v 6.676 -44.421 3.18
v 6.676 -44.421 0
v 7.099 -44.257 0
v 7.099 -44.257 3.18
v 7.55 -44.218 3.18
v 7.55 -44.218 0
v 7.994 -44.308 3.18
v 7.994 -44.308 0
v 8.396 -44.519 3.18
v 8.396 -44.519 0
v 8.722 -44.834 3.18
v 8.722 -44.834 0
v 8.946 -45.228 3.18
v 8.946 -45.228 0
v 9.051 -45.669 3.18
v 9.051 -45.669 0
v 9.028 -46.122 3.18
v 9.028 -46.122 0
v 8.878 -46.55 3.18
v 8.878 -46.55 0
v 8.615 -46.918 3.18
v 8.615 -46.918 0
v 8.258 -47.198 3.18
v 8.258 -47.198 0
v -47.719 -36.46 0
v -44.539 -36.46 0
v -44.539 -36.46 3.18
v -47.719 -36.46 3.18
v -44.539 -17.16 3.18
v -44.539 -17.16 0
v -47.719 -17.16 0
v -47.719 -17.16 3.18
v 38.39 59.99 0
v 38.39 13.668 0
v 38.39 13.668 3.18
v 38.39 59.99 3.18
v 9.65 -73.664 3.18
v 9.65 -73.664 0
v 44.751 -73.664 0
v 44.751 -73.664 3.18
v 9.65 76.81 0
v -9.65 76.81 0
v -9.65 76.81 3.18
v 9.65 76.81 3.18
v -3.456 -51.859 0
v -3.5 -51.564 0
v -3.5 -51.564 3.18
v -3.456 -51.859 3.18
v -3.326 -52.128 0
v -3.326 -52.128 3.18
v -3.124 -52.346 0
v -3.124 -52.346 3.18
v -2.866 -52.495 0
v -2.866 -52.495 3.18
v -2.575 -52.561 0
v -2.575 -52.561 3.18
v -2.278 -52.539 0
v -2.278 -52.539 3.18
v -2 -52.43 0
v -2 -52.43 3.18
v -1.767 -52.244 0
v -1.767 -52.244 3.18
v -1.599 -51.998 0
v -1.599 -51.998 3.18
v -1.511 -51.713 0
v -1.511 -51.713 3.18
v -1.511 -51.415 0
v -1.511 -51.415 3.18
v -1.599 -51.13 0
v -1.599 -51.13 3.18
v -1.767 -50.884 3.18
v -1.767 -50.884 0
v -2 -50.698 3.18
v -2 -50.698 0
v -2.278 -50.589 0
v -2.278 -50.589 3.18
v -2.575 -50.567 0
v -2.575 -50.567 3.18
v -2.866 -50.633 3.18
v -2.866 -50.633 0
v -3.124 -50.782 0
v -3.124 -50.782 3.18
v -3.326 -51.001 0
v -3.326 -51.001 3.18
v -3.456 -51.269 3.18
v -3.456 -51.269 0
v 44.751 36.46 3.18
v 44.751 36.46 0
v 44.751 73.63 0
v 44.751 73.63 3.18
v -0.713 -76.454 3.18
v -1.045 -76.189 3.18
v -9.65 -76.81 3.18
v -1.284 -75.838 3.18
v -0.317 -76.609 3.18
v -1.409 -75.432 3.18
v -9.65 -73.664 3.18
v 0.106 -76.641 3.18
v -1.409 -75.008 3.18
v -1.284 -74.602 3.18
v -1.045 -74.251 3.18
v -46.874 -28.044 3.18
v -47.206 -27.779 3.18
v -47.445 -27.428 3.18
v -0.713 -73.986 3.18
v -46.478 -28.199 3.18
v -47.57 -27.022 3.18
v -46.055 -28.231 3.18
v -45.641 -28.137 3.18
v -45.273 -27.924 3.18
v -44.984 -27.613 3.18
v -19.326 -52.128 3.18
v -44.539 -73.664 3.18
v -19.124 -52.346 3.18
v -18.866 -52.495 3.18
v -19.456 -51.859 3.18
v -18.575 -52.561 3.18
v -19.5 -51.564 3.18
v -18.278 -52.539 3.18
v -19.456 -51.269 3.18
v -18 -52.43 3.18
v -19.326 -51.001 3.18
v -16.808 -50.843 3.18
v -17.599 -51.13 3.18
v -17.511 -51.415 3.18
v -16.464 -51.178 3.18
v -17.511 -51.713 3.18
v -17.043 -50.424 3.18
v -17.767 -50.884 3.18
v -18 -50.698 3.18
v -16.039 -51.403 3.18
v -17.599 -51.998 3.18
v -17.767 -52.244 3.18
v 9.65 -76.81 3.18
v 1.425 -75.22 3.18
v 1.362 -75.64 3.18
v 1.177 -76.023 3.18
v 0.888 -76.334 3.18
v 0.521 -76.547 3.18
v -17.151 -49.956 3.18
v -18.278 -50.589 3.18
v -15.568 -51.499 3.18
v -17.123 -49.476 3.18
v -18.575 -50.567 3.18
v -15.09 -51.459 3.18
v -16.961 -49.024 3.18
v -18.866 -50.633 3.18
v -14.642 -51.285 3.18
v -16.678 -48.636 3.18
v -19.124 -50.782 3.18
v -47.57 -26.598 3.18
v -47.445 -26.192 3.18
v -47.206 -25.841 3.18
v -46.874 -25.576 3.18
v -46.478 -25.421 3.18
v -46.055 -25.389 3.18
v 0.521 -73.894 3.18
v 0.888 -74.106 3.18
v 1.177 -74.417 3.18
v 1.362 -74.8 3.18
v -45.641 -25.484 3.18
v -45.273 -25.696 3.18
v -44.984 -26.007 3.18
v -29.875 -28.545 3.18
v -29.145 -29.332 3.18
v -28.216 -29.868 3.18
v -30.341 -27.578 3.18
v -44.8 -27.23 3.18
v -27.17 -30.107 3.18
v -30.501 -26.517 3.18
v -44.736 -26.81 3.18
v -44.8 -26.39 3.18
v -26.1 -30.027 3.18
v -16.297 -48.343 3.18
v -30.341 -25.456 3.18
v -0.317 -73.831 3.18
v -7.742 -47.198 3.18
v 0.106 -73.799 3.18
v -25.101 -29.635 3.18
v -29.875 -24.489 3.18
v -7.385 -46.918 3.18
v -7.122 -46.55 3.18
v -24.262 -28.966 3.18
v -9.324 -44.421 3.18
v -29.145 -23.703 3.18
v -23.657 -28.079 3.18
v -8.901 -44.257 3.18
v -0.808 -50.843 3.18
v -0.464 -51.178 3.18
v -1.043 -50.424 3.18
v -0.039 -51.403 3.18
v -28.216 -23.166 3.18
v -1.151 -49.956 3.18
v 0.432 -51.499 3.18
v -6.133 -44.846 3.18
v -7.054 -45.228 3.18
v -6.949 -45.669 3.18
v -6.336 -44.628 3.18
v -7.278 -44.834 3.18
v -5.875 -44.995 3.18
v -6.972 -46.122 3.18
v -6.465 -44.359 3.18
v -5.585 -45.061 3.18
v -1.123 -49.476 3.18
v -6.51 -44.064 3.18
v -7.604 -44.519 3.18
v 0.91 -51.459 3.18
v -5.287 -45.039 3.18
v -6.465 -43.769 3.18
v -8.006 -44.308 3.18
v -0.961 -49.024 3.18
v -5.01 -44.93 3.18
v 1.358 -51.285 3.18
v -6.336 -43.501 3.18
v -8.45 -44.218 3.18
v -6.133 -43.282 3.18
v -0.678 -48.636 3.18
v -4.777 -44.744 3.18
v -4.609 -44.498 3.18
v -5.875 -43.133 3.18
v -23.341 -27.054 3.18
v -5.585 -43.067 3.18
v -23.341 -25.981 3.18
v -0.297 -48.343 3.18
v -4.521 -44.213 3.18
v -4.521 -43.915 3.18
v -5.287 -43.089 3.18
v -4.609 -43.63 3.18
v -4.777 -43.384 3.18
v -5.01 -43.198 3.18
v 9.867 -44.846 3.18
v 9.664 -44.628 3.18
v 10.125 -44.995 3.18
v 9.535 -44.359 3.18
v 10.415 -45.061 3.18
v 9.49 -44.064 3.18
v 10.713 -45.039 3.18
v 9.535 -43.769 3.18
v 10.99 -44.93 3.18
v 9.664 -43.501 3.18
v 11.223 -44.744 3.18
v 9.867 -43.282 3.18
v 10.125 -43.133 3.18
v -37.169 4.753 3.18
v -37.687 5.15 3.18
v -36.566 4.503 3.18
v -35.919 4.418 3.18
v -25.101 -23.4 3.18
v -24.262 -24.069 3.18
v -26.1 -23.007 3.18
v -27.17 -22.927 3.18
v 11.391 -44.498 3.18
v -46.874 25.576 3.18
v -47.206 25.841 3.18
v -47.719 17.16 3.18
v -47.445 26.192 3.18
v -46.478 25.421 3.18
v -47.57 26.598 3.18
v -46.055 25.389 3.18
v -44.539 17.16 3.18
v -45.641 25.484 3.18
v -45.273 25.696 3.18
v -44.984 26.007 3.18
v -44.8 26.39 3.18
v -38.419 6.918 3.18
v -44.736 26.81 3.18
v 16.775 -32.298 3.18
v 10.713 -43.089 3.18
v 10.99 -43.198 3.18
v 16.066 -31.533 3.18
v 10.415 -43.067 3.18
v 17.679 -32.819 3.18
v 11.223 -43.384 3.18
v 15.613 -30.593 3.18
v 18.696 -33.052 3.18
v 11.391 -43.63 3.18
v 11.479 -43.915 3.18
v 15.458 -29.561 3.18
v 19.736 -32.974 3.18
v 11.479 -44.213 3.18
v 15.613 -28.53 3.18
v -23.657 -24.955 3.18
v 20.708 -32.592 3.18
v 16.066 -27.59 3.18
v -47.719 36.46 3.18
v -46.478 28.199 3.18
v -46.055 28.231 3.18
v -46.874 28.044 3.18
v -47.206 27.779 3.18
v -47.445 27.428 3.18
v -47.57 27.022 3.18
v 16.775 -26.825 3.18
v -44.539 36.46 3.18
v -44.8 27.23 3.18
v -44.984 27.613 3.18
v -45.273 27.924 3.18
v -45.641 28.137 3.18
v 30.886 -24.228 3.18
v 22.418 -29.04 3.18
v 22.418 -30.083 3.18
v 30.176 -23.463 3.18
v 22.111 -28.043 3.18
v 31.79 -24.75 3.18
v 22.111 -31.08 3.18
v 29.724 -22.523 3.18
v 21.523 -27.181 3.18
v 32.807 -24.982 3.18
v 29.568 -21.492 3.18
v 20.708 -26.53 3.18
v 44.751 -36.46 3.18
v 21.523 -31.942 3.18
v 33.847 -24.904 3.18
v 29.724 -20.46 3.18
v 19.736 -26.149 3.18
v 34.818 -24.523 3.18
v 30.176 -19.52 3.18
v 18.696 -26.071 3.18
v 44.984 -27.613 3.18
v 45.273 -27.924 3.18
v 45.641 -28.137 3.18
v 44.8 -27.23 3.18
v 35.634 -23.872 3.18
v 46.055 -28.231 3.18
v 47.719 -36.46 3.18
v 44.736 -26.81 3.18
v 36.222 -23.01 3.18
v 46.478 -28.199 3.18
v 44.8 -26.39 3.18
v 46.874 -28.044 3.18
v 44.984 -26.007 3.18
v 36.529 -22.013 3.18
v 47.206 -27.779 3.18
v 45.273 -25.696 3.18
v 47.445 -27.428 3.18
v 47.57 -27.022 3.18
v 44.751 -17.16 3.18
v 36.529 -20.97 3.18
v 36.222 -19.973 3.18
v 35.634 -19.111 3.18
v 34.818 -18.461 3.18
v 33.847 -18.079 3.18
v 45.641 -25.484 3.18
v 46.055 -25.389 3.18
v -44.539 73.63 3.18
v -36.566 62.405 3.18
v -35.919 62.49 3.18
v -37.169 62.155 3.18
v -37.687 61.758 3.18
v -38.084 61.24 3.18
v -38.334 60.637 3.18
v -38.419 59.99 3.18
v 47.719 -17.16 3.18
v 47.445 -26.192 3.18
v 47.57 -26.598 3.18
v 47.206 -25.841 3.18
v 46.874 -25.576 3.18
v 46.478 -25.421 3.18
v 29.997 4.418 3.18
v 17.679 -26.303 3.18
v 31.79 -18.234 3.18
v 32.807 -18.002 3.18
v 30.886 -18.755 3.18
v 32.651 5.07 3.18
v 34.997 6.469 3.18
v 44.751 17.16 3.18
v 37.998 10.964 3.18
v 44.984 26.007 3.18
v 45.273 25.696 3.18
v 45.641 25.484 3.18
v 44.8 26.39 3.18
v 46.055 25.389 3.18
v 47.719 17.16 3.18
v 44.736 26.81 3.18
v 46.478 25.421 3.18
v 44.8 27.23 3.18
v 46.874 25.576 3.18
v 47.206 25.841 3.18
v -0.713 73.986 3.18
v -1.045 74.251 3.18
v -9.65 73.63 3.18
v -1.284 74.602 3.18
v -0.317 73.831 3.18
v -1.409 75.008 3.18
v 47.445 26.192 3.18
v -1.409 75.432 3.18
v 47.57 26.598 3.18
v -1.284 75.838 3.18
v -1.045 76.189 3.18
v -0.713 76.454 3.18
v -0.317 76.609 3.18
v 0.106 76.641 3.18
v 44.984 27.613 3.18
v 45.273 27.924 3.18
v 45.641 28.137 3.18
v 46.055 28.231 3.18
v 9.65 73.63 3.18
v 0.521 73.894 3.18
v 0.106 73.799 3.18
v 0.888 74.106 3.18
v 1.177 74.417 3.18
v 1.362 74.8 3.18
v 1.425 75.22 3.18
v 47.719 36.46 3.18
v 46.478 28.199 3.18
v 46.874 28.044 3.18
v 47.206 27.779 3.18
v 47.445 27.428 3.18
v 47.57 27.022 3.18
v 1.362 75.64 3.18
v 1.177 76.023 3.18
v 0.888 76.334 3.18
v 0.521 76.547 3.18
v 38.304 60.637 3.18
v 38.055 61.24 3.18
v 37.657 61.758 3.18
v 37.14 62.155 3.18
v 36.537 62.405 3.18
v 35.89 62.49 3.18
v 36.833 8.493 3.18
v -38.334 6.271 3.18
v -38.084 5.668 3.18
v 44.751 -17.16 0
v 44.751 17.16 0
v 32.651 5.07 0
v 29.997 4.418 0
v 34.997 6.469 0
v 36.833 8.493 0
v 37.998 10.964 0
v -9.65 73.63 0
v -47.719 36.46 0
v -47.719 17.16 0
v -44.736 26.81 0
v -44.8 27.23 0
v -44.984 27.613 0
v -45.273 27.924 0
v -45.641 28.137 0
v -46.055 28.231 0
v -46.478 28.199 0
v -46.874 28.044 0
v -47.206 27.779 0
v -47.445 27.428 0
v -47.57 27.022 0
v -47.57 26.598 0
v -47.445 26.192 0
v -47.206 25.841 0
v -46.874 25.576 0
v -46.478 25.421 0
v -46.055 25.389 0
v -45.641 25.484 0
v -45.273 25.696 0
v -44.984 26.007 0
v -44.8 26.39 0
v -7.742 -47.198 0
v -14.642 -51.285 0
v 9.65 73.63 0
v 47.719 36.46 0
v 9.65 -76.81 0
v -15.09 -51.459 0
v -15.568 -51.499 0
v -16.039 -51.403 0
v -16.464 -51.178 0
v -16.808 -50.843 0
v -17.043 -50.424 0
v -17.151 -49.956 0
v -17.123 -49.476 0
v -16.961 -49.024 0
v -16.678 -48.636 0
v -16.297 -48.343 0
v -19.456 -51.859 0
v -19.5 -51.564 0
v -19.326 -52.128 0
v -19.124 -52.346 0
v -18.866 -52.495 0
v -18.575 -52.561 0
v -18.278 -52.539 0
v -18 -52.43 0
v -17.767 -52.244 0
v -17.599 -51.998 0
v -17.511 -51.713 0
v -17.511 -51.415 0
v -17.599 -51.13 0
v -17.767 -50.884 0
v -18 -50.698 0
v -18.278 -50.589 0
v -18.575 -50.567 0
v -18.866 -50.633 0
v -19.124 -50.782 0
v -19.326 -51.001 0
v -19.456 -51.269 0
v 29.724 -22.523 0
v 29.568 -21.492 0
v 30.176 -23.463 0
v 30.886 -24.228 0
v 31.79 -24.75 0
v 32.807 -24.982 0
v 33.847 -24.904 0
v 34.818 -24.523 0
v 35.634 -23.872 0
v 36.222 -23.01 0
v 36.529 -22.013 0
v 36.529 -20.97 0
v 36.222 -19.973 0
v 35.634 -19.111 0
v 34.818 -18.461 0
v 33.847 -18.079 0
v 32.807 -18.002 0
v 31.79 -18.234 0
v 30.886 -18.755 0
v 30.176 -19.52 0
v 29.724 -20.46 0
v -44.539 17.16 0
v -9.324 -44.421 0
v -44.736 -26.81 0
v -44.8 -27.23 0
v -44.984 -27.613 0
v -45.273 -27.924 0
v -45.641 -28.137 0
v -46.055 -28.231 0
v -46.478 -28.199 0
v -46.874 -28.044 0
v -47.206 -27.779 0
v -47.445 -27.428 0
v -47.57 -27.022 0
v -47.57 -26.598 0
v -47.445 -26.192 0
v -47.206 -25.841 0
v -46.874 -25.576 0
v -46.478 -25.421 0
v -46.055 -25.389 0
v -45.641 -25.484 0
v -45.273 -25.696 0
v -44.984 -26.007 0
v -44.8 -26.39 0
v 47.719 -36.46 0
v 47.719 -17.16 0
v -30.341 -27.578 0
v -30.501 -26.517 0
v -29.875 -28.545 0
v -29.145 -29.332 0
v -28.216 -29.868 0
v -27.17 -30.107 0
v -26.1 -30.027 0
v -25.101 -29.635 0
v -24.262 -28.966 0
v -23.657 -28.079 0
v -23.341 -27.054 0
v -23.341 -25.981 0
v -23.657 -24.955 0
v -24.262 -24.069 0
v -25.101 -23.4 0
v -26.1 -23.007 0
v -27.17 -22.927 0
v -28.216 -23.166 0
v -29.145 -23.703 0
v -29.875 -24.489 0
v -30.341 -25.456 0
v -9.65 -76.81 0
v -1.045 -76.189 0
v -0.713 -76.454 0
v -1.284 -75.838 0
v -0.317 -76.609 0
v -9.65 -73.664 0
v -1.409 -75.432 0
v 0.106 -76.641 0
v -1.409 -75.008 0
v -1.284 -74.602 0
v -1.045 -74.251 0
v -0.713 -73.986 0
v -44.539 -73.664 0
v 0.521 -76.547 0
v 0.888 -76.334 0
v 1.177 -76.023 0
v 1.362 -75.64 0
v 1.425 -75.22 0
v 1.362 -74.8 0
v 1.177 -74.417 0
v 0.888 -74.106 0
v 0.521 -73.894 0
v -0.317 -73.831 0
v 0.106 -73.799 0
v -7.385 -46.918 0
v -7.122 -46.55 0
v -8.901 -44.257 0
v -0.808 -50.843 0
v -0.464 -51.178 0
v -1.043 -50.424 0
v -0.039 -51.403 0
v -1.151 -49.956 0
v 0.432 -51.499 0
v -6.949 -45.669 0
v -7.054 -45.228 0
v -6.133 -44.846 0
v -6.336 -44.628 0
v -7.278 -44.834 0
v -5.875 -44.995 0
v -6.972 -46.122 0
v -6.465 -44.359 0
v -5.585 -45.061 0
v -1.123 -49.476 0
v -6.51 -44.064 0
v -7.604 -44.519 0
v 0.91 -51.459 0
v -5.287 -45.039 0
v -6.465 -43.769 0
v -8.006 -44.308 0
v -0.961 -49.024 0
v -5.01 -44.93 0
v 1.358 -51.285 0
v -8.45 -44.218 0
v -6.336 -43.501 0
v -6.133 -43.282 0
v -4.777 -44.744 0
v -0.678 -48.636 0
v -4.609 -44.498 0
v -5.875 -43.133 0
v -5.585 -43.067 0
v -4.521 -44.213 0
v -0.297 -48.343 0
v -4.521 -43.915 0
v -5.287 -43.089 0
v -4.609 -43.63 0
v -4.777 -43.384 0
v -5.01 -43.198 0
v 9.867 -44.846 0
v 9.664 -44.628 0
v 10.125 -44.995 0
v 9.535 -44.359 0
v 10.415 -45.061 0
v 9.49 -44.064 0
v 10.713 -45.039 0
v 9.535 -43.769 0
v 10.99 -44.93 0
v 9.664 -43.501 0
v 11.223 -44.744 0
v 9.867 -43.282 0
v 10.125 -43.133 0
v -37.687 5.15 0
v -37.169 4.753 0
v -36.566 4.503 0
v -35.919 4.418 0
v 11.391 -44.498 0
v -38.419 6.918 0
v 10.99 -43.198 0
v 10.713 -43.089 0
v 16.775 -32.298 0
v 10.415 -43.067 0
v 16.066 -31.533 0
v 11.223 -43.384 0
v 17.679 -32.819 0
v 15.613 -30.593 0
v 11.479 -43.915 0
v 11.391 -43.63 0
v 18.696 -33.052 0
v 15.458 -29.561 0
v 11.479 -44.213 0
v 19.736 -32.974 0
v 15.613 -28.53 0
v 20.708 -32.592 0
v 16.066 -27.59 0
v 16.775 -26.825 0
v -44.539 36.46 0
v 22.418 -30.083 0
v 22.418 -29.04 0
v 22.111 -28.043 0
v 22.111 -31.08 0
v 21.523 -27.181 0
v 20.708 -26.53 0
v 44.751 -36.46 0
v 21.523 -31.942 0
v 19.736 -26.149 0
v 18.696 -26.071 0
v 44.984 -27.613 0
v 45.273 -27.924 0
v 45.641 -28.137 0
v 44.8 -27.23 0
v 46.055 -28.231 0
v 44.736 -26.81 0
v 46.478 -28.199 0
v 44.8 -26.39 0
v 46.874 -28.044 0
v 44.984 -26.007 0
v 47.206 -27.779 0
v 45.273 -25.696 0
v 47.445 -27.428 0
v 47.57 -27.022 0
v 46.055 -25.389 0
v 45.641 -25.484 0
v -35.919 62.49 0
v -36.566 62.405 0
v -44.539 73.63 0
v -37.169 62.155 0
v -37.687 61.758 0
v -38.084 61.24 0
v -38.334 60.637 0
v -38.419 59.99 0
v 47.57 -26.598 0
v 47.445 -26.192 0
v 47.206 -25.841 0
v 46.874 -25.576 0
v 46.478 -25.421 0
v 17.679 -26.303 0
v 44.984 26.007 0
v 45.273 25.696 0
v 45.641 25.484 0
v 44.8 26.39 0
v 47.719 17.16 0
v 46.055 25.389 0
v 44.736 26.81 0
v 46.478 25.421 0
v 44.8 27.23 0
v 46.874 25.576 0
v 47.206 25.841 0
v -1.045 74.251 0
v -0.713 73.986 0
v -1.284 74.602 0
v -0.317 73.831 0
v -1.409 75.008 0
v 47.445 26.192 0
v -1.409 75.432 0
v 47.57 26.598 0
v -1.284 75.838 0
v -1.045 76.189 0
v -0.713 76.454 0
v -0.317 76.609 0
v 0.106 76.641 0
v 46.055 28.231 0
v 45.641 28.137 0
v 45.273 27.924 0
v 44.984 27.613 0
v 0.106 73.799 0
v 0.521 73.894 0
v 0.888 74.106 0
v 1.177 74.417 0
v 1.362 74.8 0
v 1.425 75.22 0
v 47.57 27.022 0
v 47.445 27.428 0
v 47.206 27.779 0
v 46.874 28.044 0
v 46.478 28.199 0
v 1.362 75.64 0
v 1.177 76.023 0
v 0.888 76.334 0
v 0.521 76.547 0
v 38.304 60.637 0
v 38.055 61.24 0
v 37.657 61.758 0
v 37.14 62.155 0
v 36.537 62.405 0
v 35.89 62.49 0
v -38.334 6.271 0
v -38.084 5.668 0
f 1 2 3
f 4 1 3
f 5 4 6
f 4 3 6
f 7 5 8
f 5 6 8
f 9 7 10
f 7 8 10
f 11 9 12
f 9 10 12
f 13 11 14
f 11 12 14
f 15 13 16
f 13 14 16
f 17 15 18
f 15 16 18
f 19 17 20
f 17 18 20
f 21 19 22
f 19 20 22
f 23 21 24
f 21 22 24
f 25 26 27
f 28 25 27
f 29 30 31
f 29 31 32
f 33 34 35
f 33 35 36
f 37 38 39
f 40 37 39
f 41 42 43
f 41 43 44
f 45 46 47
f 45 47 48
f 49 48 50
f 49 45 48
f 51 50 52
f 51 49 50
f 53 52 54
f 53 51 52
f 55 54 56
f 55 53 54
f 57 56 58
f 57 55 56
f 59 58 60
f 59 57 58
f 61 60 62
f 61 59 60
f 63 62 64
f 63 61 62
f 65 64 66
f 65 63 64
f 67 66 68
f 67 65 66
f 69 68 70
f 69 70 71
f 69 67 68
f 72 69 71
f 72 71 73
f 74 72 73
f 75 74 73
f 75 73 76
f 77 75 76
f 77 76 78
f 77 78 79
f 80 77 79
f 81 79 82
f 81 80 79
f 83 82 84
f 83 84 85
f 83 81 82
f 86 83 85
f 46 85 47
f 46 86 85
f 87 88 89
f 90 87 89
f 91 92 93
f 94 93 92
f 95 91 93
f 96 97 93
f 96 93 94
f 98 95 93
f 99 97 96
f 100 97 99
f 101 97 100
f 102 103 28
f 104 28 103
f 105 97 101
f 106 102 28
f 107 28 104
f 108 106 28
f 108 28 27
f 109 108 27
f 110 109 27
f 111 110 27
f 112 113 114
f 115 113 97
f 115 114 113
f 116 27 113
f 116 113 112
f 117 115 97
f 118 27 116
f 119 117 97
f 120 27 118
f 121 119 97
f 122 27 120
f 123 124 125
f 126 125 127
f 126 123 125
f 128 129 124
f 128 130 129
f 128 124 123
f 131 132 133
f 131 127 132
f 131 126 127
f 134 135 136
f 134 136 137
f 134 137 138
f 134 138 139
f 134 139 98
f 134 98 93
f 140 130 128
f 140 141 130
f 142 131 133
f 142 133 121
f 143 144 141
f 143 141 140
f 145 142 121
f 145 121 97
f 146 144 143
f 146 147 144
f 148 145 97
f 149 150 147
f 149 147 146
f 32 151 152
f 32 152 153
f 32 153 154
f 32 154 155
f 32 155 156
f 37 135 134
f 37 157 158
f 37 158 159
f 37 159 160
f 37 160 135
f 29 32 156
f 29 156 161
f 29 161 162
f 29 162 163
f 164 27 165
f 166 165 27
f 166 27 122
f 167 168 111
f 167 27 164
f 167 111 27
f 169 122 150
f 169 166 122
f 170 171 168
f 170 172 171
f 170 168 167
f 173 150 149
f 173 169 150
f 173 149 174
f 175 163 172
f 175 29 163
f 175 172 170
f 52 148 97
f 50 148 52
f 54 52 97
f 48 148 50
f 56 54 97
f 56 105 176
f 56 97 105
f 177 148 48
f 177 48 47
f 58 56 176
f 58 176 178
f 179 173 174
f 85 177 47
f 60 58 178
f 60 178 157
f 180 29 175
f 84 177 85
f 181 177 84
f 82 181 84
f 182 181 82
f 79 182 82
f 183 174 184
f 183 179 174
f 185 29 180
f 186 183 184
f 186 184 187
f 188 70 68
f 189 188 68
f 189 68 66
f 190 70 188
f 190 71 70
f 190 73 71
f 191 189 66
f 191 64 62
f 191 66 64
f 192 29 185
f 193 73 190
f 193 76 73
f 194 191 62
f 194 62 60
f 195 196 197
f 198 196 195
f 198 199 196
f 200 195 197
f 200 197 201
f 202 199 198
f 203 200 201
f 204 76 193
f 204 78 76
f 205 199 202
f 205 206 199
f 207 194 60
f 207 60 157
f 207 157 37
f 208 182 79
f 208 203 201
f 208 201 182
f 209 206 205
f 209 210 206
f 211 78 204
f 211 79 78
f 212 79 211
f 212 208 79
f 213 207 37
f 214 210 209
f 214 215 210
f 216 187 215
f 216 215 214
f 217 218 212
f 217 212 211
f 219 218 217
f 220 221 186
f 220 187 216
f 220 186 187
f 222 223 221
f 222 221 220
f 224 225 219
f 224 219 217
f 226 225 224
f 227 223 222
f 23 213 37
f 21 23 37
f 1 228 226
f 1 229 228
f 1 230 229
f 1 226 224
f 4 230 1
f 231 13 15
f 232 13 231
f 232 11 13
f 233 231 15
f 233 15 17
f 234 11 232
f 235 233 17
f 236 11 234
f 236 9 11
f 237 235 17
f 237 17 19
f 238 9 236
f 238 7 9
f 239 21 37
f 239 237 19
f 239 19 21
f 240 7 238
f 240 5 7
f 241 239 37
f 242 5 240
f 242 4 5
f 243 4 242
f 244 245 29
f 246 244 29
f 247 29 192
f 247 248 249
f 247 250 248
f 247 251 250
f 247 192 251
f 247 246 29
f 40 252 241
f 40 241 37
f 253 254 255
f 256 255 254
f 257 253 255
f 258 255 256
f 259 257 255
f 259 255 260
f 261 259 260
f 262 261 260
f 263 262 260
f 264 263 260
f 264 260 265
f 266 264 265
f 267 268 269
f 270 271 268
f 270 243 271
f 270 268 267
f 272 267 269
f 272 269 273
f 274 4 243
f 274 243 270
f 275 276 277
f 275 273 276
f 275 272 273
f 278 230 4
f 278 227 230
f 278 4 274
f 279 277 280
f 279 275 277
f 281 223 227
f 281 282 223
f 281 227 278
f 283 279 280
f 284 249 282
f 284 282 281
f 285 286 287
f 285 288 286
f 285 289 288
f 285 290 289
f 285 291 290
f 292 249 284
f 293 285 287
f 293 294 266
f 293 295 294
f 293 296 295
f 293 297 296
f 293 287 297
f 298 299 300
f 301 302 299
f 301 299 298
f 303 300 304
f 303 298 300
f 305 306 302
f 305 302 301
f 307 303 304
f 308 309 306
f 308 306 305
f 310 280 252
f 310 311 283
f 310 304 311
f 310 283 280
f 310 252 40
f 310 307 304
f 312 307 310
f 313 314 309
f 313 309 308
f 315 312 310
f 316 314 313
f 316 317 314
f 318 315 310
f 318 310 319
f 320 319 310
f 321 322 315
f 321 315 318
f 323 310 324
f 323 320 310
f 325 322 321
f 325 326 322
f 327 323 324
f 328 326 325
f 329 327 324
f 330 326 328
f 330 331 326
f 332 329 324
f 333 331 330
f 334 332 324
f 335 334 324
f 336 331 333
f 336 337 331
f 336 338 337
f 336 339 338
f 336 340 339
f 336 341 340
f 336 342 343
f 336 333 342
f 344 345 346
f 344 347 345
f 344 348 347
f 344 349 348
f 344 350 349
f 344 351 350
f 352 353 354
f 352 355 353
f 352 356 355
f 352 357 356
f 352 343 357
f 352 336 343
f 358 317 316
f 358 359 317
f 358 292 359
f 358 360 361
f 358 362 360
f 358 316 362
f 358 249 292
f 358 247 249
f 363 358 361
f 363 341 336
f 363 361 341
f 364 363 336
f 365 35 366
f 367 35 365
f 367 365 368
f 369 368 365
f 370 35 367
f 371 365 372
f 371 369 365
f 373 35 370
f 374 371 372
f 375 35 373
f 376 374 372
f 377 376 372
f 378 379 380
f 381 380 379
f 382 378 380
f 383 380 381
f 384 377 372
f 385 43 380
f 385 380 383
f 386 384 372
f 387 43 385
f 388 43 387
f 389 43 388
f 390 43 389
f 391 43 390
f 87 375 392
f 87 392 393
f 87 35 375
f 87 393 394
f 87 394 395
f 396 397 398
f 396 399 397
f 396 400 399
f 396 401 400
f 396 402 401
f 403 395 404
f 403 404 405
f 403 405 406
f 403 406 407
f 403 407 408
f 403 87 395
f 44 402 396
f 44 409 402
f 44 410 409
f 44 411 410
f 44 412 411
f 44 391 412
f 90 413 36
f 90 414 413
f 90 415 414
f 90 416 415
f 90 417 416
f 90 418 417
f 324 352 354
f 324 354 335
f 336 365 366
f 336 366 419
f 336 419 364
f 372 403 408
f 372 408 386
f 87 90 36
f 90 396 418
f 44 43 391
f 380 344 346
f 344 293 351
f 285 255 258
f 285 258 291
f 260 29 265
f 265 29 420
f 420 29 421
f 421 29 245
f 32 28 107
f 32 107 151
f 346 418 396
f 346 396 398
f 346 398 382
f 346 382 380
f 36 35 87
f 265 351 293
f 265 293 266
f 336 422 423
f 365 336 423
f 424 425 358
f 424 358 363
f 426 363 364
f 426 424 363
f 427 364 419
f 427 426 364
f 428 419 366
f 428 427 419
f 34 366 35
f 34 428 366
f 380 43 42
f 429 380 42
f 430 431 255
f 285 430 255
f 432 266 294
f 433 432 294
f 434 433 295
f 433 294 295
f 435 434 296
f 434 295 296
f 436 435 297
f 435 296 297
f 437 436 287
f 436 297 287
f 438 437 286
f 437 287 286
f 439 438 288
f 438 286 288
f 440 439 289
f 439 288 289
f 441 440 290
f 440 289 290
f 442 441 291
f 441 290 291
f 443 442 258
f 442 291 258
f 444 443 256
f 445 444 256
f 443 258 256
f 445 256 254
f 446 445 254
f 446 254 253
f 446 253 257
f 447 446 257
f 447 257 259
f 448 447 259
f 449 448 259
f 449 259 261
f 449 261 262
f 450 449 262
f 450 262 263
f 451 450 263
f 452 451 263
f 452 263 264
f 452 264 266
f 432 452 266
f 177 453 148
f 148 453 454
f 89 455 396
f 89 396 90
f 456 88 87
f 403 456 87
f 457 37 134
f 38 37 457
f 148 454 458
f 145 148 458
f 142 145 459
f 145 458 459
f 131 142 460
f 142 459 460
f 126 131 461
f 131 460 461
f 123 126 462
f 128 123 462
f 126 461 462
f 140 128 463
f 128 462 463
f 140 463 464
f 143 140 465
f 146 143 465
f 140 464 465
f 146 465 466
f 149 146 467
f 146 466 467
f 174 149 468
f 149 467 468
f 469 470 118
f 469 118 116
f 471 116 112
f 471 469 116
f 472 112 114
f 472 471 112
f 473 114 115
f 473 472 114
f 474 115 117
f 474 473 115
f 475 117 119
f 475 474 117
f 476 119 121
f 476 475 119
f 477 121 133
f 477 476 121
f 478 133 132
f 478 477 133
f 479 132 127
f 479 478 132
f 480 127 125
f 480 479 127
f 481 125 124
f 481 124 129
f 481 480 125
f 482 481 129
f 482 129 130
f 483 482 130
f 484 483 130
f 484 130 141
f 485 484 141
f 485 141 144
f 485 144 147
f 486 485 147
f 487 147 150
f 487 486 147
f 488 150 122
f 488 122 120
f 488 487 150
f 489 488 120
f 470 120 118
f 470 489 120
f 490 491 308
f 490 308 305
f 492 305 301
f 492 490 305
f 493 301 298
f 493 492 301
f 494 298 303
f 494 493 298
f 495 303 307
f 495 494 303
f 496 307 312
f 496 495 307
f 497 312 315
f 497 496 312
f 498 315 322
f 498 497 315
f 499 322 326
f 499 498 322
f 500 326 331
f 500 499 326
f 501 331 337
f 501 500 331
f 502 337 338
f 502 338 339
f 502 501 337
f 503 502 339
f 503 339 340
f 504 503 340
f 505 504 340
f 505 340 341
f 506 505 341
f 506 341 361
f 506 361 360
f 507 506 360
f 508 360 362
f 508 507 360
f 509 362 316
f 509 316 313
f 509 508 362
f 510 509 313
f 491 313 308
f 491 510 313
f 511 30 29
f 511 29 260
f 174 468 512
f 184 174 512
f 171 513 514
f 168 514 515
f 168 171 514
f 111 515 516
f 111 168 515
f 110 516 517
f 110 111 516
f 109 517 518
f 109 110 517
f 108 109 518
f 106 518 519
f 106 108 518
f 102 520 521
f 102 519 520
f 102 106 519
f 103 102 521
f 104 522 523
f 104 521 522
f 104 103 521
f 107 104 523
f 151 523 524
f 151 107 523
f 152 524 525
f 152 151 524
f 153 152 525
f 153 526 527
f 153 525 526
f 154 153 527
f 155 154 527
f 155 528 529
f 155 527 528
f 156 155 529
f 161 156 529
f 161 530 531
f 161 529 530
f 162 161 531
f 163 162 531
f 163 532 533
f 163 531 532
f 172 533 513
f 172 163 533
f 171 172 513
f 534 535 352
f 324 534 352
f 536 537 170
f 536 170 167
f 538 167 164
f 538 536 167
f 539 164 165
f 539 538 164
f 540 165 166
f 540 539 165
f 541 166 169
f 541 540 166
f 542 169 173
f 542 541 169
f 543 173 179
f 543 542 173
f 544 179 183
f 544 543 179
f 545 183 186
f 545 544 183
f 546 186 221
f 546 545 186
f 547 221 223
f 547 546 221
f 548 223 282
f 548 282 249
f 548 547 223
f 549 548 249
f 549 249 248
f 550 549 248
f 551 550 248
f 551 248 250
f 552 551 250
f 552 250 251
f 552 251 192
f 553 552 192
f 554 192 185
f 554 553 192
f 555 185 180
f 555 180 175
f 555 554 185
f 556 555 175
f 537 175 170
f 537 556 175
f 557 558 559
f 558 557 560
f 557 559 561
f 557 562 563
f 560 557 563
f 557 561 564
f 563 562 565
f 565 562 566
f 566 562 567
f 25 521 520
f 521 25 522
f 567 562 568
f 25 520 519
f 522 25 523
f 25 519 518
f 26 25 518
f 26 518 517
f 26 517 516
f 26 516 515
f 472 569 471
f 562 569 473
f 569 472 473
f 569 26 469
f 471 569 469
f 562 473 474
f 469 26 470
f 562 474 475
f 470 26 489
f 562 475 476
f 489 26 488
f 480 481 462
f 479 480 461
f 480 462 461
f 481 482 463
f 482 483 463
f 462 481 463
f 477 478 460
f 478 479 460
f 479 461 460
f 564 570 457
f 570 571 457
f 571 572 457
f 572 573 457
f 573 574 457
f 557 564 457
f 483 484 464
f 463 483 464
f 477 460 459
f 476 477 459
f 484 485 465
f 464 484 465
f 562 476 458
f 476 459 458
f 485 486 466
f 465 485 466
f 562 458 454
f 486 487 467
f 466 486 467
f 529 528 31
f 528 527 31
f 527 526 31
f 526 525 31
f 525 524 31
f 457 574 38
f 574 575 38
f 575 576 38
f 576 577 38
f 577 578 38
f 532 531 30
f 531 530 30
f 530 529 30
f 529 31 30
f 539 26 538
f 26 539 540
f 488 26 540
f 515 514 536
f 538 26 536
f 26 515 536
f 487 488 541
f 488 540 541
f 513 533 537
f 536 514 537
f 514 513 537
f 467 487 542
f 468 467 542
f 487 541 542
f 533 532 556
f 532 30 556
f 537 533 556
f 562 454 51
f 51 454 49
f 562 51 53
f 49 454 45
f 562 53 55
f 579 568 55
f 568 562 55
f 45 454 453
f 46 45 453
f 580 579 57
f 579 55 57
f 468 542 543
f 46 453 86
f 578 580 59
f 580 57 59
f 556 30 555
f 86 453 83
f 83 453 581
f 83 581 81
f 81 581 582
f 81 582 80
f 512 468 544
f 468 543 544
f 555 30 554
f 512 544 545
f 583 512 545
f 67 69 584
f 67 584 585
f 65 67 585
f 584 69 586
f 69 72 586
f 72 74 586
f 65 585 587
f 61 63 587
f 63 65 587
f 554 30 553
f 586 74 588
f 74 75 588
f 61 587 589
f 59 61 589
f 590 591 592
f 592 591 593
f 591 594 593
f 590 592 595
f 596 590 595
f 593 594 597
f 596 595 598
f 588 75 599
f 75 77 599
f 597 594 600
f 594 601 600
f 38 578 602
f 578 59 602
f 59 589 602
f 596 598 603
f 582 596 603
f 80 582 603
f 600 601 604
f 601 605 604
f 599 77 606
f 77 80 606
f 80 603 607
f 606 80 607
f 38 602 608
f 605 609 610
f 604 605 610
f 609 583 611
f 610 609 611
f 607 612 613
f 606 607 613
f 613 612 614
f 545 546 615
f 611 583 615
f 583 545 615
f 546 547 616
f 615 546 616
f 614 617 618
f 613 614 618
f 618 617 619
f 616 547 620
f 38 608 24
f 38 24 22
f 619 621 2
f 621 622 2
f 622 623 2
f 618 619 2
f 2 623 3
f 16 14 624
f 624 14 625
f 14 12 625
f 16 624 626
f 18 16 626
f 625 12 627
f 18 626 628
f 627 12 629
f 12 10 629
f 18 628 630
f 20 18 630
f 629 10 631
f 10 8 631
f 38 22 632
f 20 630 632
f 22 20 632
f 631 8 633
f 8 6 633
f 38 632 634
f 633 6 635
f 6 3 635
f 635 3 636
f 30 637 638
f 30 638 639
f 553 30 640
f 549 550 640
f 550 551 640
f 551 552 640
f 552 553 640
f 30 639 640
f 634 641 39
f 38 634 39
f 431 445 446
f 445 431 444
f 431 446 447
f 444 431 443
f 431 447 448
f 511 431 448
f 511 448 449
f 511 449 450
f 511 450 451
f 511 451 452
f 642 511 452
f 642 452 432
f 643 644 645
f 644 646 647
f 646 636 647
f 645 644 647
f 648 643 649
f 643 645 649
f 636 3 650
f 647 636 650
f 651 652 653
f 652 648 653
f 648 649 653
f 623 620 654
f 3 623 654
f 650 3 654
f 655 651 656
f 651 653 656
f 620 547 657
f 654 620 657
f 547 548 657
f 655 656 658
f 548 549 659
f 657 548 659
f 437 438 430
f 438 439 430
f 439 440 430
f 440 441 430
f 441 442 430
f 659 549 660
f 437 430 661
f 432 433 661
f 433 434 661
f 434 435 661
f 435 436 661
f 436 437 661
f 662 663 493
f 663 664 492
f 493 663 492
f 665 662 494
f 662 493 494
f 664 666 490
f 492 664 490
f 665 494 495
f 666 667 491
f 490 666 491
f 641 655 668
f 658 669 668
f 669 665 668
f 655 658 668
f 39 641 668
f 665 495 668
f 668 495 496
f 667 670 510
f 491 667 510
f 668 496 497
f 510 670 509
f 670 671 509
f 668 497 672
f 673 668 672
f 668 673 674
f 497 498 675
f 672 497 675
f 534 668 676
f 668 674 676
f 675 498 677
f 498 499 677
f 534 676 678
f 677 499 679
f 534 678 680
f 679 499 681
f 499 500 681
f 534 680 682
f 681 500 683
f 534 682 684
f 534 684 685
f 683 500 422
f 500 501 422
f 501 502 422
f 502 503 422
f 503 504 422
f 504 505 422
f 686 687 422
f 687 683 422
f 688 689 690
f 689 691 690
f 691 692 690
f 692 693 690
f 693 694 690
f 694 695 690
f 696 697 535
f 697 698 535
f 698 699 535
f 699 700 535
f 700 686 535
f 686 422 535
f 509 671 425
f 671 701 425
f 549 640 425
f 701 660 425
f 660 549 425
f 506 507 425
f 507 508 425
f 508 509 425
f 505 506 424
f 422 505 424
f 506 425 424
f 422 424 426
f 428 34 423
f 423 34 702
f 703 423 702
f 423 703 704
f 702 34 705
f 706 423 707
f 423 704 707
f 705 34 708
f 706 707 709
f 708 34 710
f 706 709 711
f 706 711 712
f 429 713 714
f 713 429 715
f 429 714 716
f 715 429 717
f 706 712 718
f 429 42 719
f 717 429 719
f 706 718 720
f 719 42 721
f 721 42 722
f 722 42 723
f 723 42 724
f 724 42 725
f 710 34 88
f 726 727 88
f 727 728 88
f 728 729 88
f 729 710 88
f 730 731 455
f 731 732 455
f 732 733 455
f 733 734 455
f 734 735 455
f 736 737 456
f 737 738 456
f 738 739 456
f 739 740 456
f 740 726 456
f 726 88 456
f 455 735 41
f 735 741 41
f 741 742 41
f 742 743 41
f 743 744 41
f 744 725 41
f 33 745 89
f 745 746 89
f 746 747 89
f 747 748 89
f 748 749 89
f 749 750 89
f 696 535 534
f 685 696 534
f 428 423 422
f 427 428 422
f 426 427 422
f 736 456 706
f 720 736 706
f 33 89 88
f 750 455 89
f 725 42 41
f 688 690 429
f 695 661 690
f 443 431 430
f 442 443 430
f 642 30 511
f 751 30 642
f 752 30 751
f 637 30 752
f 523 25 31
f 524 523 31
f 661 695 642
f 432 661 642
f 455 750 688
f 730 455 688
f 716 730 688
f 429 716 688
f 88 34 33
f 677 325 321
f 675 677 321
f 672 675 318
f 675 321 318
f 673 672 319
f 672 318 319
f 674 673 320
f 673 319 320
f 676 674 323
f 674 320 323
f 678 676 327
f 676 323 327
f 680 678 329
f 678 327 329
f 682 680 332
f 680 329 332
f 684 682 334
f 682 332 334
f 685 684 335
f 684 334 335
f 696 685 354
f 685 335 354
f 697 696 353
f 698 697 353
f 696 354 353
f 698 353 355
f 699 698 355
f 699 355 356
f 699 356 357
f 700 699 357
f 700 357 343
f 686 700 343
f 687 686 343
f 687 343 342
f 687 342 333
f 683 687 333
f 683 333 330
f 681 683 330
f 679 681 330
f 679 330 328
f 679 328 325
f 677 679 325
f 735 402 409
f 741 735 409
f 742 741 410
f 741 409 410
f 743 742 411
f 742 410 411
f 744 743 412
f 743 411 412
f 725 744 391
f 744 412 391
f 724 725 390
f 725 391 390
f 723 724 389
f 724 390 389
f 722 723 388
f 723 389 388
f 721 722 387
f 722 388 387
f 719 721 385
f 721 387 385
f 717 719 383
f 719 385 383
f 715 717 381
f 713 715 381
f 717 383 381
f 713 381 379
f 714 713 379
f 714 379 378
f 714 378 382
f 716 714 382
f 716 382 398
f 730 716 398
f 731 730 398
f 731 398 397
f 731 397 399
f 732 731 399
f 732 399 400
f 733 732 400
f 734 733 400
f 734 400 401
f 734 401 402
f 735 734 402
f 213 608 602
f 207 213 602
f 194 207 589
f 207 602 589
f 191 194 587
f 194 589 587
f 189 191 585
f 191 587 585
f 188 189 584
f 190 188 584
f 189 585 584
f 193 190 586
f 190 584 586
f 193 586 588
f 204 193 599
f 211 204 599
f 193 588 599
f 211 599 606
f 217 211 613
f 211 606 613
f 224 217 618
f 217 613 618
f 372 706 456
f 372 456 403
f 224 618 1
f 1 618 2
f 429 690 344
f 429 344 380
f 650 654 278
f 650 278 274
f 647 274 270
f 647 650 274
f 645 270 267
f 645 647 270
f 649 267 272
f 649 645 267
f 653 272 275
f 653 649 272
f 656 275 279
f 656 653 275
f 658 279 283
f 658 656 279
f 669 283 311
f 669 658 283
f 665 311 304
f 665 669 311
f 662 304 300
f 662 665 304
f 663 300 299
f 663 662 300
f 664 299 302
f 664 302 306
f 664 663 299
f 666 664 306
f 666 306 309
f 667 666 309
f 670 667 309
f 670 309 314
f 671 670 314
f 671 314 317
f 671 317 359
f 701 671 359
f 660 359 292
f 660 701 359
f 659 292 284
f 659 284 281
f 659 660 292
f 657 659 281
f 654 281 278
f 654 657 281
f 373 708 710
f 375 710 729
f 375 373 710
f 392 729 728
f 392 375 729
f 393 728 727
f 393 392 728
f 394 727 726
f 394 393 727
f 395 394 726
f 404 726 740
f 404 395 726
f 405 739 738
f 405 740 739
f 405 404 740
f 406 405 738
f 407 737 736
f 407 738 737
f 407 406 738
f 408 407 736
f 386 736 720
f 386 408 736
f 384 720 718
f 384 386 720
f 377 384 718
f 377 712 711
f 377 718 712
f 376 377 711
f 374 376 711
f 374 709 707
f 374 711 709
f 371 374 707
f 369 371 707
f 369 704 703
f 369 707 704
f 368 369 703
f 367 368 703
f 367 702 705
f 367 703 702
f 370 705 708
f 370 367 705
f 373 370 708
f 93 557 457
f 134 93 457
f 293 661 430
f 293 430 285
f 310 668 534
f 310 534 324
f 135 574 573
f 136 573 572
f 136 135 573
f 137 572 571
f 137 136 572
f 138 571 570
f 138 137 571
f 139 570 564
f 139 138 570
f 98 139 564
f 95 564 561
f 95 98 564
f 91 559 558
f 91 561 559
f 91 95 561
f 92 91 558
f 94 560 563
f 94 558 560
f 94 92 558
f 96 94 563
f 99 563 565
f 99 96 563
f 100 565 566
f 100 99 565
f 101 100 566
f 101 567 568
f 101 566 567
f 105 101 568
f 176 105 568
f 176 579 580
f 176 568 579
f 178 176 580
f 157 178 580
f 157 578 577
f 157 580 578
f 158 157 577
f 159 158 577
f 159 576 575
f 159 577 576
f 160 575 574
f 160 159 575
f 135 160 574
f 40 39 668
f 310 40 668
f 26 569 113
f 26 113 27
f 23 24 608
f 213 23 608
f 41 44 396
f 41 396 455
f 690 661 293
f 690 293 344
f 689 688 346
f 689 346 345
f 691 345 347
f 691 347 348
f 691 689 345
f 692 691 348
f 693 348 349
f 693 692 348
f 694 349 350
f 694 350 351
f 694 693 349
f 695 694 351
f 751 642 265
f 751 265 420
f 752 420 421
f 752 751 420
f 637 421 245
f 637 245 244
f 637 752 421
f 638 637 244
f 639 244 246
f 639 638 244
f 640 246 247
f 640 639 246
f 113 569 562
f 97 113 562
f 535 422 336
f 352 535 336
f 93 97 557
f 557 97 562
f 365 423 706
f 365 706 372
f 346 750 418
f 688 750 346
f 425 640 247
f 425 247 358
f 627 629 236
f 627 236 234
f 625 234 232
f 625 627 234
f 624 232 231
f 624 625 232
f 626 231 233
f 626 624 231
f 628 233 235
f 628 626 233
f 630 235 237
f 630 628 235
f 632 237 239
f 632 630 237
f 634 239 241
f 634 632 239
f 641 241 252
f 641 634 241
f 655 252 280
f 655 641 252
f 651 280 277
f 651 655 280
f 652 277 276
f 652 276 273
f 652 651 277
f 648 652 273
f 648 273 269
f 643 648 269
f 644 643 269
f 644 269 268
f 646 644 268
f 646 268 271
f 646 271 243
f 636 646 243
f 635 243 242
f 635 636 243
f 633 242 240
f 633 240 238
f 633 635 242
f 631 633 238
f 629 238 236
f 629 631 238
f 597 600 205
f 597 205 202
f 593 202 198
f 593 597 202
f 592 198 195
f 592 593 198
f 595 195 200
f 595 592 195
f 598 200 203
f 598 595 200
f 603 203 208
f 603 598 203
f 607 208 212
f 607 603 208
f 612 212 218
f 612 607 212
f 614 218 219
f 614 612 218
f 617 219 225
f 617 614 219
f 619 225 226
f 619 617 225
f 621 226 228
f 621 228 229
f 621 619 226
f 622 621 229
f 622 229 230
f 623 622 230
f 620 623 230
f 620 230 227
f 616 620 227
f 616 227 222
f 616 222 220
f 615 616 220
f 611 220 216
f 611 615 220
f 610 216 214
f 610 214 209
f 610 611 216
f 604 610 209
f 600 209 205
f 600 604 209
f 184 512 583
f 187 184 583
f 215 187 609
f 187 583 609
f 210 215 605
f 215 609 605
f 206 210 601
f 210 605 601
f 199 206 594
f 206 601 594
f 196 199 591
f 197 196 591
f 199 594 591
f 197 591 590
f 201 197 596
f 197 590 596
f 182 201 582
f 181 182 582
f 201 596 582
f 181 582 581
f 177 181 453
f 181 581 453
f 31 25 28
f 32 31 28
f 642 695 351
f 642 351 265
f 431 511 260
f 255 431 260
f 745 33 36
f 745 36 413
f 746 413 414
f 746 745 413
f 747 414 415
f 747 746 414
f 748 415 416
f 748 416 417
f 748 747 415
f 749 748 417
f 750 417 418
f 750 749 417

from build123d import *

# Parameters (mm, degrees)
SKETCH1_7_W             = 89.29
SKETCH1_7_H             = 147.294272307
SKETCH1_7_R             = 1
SKETCH1_7_R_2           = 3.6
SKETCH1_7_R_3           = 3.5
BODY_DEPTH              = 3.18
SKETCH2_W               = 19.3
SKETCH2_H               = 3.18
BOSS_EXTRUDE1_DEPTH     = 3.18
SKETCH3_R               = 1.425
CUT_EXTRUDE1_DEPTH      = 89.95245291
SKETCH4_W               = 3.18
SKETCH4_H               = 19.3
BOSS_EXTRUDE2_DEPTH     = 3.18
SKETCH5_R               = 1.425
CUT_EXTRUDE2_DEPTH      = 91.482140695
MIRROR2_COPY_1_SKETCH_W = 3.18
MIRROR2_COPY_1_SKETCH_H = 19.3
MIRROR2_COPY_1_DEPTH    = 3.18
MIRROR2_COPY_2_SKETCH_R = 1.425
MIRROR2_COPY_2_DEPTH    = 91.482140695
MIRROR2_COPY_3_SKETCH_W = 3.18
MIRROR2_COPY_3_SKETCH_H = 19.3
MIRROR2_COPY_3_DEPTH    = 3.18
MIRROR2_COPY_4_SKETCH_R = 1.425
MIRROR2_COPY_4_DEPTH    = 91.482140695


with BuildPart() as part:
    # Sketch1<7> → Body (new body)
    with BuildSketch(Plane.XY):
        with Locations((0.105848892, -0.017058674)):
            Rectangle(SKETCH1_7_W, SKETCH1_7_H)
        with Locations((-18.500240022, -51.564194828)):
            Circle(SKETCH1_7_R, mode=Mode.SUBTRACT)
        with BuildLine():
            Line((-7.741744524, -47.198455643), (-12.157690739, -49.814194828))
            Line((-12.157690739, -49.814194828), (-14.641551271, -51.285483428))
            ThreePointArc((-14.641551271, -51.285483428), (-16.940439708, -50.641794665), (-16.296750946, -48.342906228))
            Line((-16.296750946, -48.342906228), (-9.324146649, -44.420816311))
            ThreePointArc((-9.324146649, -44.420816311), (-7.152105158, -45.022980632), (-7.741744524, -47.198455643))
        make_face(mode=Mode.SUBTRACT)
        with Locations((-2.500240022, -51.564194828)):
            Circle(SKETCH1_7_R, mode=Mode.SUBTRACT)
        with Locations((-5.509858965, -44.064194828)):
            Circle(SKETCH1_7_R, mode=Mode.SUBTRACT)
        with Locations((-26.900831216, -26.517202566)):
            Circle(SKETCH1_7_R_2, mode=Mode.SUBTRACT)
        with BuildLine():
            ThreePointArc((1.358448729, -51.285483428), (-0.321371004, -51.271360873), (-1.157230382, -49.814194828))
            ThreePointArc((-1.157230382, -49.814194828), (-0.926317154, -48.961974932), (-0.296750946, -48.342906228))
            Line((-0.296750946, -48.342906228), (6.675853351, -44.420816311))
            ThreePointArc((6.675853351, -44.420816311), (8.847894842, -45.022980632), (8.258255476, -47.198455643))
            Line((8.258255476, -47.198455643), (1.358448729, -51.285483428))
        make_face(mode=Mode.SUBTRACT)
        with Locations((10.490141035, -44.064194828)):
            Circle(SKETCH1_7_R, mode=Mode.SUBTRACT)
        with Locations((18.957561099, -29.561304194)):
            Circle(SKETCH1_7_R_3, mode=Mode.SUBTRACT)
        with Locations((33.068305831, -21.491722051)):
            Circle(SKETCH1_7_R_3, mode=Mode.SUBTRACT)
        with BuildLine():
            Line((-35.919151108, 62.490077479), (35.889642662, 62.490077479))
            ThreePointArc((35.889642662, 62.490077479), (37.657409615, 61.757844432), (38.389642662, 59.990077479))
            Line((38.389642662, 59.990077479), (38.389642662, 13.668014642))
            ThreePointArc((38.389642662, 13.668014642), (35.990372343, 7.41277043), (29.997375098, 4.418014642))
            Line((29.997375098, 4.418014642), (-35.919151108, 4.418014642))
            ThreePointArc((-35.919151108, 4.418014642), (-37.686918061, 5.150247689), (-38.419151108, 6.918014642))
            Line((-38.419151108, 6.918014642), (-38.419151108, 59.990077479))
            ThreePointArc((-38.419151108, 59.990077479), (-37.686918061, 61.757844432), (-35.919151108, 62.490077479))
        make_face(mode=Mode.SUBTRACT)
    extrude(amount=BODY_DEPTH)

    # Sketch2 → Boss-Extrude1 (add)
    with BuildSketch(Plane(origin=(0, 73.630077479, 0), x_dir=(1, 0, 0), z_dir=(0, 1, 0))):
        with Locations((0, -1.59)):
            Rectangle(SKETCH2_W, SKETCH2_H)
    boss_extrude1 = extrude(amount=BOSS_EXTRUDE1_DEPTH)

    # Sketch3 → Cut-Extrude1 (cut, through all)
    with BuildSketch(Plane.XY.offset(3.18)):
        with Locations((0, 75.220077479)):
            Circle(SKETCH3_R)
    cut_extrude1 = extrude(amount=-CUT_EXTRUDE1_DEPTH, mode=Mode.SUBTRACT)

    # Sketch4 → Boss-Extrude2 (add)
    with BuildSketch(Plane.ZY.offset(44.539151108)):
        with Locations((1.59, 26.810077479)):
            Rectangle(SKETCH4_W, SKETCH4_H)
    boss_extrude2 = extrude(amount=BOSS_EXTRUDE2_DEPTH)

    # Sketch5 → Cut-Extrude2 (cut, through all)
    with BuildSketch(Plane.XY.offset(3.18)):
        with Locations((-46.161220751, 26.810077479)):
            Circle(SKETCH5_R)
    cut_extrude2 = extrude(amount=-CUT_EXTRUDE2_DEPTH, mode=Mode.SUBTRACT)

    # Mirror1: Boss-Extrude2, Cut-Extrude2 across plane
    add(boss_extrude2.mirror(Plane(origin=(0, 0, 0), x_dir=(0, 0, 1), z_dir=(1, 0, 0))))
    add(cut_extrude2.mirror(Plane(origin=(0, 0, 0), x_dir=(0, 0, 1), z_dir=(1, 0, 0))), mode=Mode.SUBTRACT)

    # Mirror2: Boss-Extrude1, Cut-Extrude1 across plane
    add(boss_extrude1.mirror(Plane.ZX))
    add(cut_extrude1.mirror(Plane.ZX), mode=Mode.SUBTRACT)

    # Mirror2 copy 1 sketch → Mirror2 copy 1 (add)
    with BuildSketch(Plane(origin=(44.539151108, 0, 0), x_dir=(0, 0, 1), z_dir=(1, 0, 0))):
        with Locations((1.59, 26.810077479)):
            Rectangle(MIRROR2_COPY_1_SKETCH_W, MIRROR2_COPY_1_SKETCH_H)
    extrude(amount=MIRROR2_COPY_1_DEPTH)

    # Mirror2 copy 2 sketch → Mirror2 copy 2 (cut, through all)
    with BuildSketch(Plane(origin=(0, 0, 3.18), x_dir=(-1, 0, 0), z_dir=(0, 0, 1))):
        with Locations((-46.161220751, 26.810077479)):
            Circle(MIRROR2_COPY_2_SKETCH_R)
    extrude(amount=-MIRROR2_COPY_2_DEPTH, mode=Mode.SUBTRACT)

    # Mirror2 copy 3 sketch → Mirror2 copy 3 (add)
    with BuildSketch(Plane.ZY.offset(44.539151108)):
        with Locations((1.59, -26.810077479)):
            Rectangle(MIRROR2_COPY_3_SKETCH_W, MIRROR2_COPY_3_SKETCH_H)
    extrude(amount=MIRROR2_COPY_3_DEPTH)

    # Mirror2 copy 4 sketch → Mirror2 copy 4 (cut, through all)
    with BuildSketch(Plane.XY.offset(3.18)):
        with Locations((-46.161220751, -26.810077479)):
            Circle(MIRROR2_COPY_4_SKETCH_R)
    extrude(amount=-MIRROR2_COPY_4_DEPTH, mode=Mode.SUBTRACT)


solid = part.part
